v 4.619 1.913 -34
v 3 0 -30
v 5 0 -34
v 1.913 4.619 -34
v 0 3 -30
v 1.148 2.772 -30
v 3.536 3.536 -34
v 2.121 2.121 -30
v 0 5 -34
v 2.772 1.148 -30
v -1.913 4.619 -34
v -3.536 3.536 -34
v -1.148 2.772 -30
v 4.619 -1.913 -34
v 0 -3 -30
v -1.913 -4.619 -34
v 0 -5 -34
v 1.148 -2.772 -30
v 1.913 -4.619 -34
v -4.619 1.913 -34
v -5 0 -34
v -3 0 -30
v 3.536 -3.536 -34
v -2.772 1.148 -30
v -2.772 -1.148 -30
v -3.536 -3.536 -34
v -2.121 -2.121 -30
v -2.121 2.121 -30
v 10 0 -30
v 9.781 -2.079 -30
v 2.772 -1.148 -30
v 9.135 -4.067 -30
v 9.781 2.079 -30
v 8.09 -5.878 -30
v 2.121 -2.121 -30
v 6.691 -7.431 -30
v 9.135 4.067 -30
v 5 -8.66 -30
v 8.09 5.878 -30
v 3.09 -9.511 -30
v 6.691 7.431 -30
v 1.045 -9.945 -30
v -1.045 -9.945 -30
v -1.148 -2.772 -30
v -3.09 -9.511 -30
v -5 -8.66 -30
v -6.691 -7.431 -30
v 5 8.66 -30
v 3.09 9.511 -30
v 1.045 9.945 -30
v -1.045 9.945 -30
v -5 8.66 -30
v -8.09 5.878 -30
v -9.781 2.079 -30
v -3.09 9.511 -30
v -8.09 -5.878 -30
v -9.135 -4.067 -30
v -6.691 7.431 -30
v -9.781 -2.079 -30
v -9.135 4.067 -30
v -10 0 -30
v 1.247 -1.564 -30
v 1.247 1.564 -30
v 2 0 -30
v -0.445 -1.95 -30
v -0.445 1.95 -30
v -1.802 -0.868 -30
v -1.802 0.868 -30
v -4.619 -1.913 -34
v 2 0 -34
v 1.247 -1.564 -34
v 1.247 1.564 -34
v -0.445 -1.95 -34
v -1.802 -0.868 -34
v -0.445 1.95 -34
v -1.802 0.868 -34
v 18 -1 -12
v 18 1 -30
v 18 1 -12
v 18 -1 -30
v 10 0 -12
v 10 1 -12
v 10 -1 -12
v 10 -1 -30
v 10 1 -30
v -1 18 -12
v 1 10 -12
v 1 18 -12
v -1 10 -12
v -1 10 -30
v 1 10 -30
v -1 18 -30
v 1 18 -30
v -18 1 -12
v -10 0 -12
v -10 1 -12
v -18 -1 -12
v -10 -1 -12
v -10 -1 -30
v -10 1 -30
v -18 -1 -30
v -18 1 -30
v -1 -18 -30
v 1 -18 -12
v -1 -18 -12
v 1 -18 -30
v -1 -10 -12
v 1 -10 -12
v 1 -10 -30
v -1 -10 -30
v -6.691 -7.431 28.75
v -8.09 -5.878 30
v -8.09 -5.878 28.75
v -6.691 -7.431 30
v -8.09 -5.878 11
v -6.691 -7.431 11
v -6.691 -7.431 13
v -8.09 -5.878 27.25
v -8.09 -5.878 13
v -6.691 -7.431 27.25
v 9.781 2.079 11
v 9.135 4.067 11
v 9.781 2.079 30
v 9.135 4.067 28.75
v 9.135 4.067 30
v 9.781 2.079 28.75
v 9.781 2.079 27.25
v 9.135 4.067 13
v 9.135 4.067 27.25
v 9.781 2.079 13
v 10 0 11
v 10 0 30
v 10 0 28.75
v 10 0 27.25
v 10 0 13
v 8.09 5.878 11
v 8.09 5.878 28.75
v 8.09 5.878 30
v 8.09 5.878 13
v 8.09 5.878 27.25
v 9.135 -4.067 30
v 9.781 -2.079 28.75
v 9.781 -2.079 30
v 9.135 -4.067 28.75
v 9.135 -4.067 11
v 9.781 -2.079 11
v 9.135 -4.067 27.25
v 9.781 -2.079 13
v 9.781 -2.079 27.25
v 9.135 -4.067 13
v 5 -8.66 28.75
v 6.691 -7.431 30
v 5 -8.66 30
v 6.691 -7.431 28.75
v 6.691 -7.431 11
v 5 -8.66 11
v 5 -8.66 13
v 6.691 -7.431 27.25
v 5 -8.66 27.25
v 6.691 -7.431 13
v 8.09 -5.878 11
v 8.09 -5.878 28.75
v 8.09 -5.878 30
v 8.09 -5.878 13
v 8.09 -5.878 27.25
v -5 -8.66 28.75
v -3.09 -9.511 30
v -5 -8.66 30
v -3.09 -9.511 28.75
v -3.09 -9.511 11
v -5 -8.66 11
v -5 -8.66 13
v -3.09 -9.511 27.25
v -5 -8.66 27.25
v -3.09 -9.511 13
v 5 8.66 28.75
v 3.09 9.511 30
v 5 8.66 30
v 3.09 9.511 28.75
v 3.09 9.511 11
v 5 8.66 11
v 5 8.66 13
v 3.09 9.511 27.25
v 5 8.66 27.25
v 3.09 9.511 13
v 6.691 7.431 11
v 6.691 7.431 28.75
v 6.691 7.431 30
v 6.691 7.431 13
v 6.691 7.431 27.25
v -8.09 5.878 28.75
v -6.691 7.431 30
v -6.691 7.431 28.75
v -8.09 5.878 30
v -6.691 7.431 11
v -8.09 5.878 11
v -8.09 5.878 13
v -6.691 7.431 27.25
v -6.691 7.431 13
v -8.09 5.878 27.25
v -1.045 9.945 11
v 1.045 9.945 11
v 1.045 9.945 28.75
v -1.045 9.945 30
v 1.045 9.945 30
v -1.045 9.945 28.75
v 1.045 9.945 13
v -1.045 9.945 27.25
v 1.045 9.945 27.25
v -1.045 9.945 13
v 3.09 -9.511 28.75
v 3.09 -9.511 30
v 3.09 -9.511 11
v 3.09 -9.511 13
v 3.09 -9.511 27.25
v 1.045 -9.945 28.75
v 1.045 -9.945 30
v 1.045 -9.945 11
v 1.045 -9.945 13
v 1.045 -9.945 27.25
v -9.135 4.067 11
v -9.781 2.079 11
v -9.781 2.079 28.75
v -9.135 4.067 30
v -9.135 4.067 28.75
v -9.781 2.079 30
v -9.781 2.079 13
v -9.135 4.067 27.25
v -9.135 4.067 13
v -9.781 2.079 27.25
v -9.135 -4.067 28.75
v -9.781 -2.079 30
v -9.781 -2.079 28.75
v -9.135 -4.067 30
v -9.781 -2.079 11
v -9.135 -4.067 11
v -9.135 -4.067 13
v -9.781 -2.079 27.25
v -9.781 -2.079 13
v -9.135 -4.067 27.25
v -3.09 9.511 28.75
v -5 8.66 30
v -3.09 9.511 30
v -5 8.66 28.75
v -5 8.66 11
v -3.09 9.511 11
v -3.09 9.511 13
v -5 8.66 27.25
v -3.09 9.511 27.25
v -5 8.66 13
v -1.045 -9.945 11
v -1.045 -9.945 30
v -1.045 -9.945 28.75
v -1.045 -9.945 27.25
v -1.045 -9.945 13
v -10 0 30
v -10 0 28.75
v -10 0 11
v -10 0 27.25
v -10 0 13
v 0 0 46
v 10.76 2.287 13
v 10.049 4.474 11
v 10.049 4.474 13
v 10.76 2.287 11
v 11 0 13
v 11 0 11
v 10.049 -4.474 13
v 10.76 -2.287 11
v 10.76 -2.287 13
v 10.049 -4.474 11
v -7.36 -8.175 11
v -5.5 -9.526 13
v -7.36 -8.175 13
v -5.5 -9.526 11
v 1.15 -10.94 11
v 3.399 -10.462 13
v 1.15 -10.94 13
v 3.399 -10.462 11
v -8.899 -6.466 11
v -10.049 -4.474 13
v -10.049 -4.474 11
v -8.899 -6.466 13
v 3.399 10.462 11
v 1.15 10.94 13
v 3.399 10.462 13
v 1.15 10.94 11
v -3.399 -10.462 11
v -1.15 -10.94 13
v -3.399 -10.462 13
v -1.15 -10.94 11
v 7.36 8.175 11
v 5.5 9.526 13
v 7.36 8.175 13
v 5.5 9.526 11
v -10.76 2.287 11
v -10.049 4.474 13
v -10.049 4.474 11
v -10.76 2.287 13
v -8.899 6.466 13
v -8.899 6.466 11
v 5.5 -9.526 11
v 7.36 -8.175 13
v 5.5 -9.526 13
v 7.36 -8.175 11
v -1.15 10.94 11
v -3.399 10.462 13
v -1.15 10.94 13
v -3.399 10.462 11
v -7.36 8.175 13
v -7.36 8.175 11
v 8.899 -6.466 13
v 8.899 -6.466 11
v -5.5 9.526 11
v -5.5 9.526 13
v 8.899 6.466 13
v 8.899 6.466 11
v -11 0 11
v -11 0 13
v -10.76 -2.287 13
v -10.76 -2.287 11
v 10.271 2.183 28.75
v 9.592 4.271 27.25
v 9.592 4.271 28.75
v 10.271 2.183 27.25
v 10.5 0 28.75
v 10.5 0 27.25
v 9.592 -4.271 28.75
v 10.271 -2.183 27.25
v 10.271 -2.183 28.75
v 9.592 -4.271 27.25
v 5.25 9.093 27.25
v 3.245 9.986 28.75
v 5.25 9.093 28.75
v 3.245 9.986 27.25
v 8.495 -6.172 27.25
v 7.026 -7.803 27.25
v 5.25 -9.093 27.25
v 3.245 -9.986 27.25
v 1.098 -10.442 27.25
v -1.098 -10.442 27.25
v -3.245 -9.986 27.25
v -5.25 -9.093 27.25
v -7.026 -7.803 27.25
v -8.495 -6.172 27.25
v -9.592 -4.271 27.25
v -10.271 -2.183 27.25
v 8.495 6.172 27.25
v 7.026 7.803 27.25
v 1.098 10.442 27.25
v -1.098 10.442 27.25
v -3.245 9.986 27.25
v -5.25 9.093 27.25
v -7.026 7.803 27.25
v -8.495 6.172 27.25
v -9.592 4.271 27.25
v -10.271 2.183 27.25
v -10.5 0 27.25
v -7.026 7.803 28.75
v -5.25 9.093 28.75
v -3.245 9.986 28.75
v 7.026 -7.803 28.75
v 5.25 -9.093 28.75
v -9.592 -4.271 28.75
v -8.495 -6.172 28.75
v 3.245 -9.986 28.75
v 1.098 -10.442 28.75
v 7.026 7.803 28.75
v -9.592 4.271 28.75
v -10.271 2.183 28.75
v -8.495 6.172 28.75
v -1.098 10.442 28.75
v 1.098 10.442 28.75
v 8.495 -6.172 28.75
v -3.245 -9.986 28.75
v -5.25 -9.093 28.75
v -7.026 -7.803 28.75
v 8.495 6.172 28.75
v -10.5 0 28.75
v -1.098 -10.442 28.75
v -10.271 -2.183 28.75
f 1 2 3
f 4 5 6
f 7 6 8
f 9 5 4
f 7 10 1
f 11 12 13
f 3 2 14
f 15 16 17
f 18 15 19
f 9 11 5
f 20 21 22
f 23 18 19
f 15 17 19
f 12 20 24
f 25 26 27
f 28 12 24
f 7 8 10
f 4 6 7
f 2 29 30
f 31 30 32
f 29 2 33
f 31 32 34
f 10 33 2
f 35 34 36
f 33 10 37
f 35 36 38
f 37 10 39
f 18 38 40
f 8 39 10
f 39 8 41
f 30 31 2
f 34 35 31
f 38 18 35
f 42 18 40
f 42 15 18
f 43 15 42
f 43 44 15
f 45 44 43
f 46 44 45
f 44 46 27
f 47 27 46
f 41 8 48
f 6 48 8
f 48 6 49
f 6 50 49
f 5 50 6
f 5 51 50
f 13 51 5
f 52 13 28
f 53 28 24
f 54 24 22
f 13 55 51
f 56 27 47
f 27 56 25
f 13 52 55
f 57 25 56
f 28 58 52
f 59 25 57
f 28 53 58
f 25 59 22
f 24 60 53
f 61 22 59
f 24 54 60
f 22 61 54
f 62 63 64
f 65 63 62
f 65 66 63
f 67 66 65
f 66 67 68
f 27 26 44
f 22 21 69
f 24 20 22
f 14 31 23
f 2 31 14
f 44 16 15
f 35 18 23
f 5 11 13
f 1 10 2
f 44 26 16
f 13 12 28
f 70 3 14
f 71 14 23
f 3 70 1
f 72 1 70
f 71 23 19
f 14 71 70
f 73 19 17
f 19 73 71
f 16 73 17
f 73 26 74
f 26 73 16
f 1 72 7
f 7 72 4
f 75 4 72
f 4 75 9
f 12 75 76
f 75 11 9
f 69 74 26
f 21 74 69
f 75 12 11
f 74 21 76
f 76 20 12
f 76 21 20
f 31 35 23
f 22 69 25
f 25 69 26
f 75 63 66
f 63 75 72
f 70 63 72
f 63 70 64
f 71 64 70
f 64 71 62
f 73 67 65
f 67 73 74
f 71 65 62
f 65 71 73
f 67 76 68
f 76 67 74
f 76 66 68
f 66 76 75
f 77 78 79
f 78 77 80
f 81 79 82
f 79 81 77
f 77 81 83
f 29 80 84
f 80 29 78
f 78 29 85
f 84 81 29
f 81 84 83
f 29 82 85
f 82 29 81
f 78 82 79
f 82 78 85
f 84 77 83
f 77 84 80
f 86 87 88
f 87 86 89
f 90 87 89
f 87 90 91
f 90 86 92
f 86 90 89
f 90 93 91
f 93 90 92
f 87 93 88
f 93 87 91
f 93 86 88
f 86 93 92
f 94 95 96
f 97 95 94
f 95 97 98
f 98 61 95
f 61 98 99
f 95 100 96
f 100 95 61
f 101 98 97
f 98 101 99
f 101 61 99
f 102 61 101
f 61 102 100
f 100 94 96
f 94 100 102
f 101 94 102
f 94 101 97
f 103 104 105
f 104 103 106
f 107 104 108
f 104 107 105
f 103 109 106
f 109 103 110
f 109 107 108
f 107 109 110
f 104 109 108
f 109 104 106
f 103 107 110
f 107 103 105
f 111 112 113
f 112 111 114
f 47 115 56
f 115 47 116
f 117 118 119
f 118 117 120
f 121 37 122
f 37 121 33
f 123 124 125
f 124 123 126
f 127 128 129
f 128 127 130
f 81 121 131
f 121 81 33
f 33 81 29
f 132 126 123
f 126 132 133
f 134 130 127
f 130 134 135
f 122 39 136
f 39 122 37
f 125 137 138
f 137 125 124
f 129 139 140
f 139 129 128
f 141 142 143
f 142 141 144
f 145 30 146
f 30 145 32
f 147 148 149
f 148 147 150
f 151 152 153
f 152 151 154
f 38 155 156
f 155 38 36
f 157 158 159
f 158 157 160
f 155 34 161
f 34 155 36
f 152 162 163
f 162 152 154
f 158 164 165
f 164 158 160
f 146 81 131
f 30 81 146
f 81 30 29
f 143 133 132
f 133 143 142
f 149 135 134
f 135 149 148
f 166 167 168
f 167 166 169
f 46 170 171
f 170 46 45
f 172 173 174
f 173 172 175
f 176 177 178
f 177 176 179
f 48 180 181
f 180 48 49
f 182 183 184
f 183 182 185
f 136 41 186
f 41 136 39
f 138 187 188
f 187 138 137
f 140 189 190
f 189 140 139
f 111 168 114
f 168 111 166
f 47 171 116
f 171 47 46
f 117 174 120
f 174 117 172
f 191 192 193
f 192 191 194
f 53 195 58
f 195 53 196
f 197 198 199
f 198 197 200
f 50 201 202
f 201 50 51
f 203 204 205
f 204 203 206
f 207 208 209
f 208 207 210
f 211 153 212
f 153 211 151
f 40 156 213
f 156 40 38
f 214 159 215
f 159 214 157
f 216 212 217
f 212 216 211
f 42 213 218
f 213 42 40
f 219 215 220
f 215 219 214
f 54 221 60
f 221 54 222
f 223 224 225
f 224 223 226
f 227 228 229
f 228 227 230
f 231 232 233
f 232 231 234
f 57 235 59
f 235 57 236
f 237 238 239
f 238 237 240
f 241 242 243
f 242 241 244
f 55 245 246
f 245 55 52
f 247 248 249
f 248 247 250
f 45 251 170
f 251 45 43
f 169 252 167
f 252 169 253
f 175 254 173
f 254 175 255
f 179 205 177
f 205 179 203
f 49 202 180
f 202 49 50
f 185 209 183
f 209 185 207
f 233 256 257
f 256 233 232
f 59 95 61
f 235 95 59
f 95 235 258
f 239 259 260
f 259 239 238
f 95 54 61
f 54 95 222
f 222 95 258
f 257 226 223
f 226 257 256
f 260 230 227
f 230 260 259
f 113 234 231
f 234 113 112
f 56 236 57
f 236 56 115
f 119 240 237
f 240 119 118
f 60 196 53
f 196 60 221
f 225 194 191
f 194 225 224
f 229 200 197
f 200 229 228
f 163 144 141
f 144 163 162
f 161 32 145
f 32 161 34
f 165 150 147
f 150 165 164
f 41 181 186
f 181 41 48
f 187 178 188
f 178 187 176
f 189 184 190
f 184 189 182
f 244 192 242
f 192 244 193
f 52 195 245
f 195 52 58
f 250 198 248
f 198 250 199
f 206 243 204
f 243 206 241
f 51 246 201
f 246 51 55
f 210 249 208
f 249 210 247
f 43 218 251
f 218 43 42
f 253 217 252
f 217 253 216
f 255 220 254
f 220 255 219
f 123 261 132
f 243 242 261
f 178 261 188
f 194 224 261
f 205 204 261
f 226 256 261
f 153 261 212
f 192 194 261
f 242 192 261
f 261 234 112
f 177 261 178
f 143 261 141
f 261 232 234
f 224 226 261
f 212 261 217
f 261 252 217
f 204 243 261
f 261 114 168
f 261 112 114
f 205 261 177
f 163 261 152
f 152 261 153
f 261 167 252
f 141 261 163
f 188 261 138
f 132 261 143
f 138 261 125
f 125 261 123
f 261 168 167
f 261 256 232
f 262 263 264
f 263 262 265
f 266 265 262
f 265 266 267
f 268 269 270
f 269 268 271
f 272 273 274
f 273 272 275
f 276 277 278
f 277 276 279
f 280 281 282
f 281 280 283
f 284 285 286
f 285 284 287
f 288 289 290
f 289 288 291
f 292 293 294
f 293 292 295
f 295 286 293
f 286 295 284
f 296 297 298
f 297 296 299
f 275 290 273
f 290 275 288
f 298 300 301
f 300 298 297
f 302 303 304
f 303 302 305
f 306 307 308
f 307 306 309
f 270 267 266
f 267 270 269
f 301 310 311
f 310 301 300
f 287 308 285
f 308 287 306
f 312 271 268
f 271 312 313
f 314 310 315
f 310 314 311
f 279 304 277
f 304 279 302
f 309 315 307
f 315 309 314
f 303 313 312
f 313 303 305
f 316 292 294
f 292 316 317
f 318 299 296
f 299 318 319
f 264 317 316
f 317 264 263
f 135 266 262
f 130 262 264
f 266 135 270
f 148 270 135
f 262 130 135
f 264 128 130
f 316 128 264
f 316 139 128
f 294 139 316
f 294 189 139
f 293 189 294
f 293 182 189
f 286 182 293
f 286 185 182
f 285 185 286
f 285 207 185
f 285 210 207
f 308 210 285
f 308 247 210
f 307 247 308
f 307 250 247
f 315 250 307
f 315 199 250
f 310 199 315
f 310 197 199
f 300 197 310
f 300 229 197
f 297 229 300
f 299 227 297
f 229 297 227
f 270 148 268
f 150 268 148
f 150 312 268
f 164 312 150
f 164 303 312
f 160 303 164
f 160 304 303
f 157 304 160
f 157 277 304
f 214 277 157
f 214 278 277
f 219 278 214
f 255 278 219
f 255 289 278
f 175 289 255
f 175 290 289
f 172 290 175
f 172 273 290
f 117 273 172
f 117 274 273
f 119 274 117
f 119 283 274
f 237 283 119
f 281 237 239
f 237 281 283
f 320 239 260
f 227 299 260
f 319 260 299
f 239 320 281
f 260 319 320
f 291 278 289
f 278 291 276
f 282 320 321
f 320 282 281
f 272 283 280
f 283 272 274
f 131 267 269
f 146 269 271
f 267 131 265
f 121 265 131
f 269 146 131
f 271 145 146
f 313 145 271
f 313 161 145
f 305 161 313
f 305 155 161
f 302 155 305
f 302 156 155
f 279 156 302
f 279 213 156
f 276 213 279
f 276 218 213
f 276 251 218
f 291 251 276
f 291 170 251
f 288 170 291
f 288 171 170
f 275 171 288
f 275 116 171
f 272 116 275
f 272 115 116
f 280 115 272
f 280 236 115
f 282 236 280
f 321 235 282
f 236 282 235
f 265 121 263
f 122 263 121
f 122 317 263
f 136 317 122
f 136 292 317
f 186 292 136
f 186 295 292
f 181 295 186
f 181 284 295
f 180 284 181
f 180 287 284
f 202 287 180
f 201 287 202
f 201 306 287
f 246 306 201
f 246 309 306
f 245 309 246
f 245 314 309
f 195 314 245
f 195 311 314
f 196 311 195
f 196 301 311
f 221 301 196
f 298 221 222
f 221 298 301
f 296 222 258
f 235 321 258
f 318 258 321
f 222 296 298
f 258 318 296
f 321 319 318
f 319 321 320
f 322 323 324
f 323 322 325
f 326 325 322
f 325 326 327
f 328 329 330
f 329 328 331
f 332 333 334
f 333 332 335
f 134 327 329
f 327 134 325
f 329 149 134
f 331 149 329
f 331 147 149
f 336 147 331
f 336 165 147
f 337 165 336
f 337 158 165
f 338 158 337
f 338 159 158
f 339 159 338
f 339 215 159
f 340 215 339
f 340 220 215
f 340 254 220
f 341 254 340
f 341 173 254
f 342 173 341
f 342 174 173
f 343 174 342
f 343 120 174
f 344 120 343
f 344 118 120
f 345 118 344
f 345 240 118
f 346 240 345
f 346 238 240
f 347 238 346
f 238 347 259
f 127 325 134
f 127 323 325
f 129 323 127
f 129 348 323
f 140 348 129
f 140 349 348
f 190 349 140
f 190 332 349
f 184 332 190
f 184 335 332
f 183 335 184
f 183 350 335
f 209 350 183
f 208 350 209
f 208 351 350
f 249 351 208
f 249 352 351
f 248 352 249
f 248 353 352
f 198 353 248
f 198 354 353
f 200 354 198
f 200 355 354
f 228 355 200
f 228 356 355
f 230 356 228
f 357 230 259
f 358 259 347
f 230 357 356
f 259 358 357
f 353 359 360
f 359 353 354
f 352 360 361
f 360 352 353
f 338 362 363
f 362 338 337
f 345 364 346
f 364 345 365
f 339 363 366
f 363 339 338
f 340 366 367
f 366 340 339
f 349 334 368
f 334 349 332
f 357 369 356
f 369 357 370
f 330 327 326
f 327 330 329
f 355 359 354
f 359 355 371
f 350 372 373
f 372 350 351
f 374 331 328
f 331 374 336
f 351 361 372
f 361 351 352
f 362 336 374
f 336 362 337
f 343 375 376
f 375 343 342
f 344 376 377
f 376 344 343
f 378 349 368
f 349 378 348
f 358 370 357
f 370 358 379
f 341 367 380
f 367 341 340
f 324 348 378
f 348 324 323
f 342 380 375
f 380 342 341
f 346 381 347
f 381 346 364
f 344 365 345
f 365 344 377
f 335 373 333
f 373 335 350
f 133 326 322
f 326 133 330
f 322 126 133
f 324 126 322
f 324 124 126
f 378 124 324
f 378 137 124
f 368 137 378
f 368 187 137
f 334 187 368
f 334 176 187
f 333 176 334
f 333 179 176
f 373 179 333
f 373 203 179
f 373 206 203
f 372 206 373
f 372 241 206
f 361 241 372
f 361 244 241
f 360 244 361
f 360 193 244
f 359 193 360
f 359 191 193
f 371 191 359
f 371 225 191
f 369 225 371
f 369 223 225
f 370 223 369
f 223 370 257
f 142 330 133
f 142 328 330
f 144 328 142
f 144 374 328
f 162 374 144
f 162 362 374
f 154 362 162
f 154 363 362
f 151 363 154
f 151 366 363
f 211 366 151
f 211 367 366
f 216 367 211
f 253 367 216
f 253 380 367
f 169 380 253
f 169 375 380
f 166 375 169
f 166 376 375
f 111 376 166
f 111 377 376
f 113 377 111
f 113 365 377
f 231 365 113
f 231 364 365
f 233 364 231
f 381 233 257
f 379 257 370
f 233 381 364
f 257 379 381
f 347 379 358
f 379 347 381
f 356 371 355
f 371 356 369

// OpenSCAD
// 3DScad sample: parametric rocket
// Features: for-loop fins, conical nose, boolean operations, symmetrical design

module scene_model() {
    body_r = 10;
    body_h = 60;
    nose_h = 16;
    fin_count = 4;
    fin_w = 8;
    fin_h = 18;
    fin_t = 2;
    port_r = 3;
    port_h = 4;

    union() {
        // Main body
        cylinder(h=body_h, r=body_r, center=true);

        // Nose cone
        translate([0, 0, body_h / 2 + nose_h / 2]) {
            cylinder(h=nose_h, r1=body_r, r2=0, center=true);
        }

        // Engine nozzle
        translate([0, 0, -body_h / 2 - port_h / 2]) {
            difference() {
                cylinder(h=port_h, r1=port_r + 2, r2=port_r, center=true);
                cylinder(h=port_h + 1, r=port_r - 1, center=true);
            }
        }

        // Tail fins
        for (i = [0 : fin_count - 1]) {
            rotate([0, 0, i * 360 / fin_count]) {
                translate([body_r + fin_w / 2, 0, -body_h / 2 + fin_h / 2]) {
                    cube([fin_w, fin_t, fin_h], center=true);
                }
            }
        }

        // Decorative window band
        translate([0, 0, body_h * 0.2]) {
            cylinder(h=2, r=body_r + 1, center=true);
        }

        // Decorative nose band
        translate([0, 0, body_h / 2 - 2]) {
            cylinder(h=1.5, r=body_r + 0.5, center=true);
        }
    }
}

scene_model();
